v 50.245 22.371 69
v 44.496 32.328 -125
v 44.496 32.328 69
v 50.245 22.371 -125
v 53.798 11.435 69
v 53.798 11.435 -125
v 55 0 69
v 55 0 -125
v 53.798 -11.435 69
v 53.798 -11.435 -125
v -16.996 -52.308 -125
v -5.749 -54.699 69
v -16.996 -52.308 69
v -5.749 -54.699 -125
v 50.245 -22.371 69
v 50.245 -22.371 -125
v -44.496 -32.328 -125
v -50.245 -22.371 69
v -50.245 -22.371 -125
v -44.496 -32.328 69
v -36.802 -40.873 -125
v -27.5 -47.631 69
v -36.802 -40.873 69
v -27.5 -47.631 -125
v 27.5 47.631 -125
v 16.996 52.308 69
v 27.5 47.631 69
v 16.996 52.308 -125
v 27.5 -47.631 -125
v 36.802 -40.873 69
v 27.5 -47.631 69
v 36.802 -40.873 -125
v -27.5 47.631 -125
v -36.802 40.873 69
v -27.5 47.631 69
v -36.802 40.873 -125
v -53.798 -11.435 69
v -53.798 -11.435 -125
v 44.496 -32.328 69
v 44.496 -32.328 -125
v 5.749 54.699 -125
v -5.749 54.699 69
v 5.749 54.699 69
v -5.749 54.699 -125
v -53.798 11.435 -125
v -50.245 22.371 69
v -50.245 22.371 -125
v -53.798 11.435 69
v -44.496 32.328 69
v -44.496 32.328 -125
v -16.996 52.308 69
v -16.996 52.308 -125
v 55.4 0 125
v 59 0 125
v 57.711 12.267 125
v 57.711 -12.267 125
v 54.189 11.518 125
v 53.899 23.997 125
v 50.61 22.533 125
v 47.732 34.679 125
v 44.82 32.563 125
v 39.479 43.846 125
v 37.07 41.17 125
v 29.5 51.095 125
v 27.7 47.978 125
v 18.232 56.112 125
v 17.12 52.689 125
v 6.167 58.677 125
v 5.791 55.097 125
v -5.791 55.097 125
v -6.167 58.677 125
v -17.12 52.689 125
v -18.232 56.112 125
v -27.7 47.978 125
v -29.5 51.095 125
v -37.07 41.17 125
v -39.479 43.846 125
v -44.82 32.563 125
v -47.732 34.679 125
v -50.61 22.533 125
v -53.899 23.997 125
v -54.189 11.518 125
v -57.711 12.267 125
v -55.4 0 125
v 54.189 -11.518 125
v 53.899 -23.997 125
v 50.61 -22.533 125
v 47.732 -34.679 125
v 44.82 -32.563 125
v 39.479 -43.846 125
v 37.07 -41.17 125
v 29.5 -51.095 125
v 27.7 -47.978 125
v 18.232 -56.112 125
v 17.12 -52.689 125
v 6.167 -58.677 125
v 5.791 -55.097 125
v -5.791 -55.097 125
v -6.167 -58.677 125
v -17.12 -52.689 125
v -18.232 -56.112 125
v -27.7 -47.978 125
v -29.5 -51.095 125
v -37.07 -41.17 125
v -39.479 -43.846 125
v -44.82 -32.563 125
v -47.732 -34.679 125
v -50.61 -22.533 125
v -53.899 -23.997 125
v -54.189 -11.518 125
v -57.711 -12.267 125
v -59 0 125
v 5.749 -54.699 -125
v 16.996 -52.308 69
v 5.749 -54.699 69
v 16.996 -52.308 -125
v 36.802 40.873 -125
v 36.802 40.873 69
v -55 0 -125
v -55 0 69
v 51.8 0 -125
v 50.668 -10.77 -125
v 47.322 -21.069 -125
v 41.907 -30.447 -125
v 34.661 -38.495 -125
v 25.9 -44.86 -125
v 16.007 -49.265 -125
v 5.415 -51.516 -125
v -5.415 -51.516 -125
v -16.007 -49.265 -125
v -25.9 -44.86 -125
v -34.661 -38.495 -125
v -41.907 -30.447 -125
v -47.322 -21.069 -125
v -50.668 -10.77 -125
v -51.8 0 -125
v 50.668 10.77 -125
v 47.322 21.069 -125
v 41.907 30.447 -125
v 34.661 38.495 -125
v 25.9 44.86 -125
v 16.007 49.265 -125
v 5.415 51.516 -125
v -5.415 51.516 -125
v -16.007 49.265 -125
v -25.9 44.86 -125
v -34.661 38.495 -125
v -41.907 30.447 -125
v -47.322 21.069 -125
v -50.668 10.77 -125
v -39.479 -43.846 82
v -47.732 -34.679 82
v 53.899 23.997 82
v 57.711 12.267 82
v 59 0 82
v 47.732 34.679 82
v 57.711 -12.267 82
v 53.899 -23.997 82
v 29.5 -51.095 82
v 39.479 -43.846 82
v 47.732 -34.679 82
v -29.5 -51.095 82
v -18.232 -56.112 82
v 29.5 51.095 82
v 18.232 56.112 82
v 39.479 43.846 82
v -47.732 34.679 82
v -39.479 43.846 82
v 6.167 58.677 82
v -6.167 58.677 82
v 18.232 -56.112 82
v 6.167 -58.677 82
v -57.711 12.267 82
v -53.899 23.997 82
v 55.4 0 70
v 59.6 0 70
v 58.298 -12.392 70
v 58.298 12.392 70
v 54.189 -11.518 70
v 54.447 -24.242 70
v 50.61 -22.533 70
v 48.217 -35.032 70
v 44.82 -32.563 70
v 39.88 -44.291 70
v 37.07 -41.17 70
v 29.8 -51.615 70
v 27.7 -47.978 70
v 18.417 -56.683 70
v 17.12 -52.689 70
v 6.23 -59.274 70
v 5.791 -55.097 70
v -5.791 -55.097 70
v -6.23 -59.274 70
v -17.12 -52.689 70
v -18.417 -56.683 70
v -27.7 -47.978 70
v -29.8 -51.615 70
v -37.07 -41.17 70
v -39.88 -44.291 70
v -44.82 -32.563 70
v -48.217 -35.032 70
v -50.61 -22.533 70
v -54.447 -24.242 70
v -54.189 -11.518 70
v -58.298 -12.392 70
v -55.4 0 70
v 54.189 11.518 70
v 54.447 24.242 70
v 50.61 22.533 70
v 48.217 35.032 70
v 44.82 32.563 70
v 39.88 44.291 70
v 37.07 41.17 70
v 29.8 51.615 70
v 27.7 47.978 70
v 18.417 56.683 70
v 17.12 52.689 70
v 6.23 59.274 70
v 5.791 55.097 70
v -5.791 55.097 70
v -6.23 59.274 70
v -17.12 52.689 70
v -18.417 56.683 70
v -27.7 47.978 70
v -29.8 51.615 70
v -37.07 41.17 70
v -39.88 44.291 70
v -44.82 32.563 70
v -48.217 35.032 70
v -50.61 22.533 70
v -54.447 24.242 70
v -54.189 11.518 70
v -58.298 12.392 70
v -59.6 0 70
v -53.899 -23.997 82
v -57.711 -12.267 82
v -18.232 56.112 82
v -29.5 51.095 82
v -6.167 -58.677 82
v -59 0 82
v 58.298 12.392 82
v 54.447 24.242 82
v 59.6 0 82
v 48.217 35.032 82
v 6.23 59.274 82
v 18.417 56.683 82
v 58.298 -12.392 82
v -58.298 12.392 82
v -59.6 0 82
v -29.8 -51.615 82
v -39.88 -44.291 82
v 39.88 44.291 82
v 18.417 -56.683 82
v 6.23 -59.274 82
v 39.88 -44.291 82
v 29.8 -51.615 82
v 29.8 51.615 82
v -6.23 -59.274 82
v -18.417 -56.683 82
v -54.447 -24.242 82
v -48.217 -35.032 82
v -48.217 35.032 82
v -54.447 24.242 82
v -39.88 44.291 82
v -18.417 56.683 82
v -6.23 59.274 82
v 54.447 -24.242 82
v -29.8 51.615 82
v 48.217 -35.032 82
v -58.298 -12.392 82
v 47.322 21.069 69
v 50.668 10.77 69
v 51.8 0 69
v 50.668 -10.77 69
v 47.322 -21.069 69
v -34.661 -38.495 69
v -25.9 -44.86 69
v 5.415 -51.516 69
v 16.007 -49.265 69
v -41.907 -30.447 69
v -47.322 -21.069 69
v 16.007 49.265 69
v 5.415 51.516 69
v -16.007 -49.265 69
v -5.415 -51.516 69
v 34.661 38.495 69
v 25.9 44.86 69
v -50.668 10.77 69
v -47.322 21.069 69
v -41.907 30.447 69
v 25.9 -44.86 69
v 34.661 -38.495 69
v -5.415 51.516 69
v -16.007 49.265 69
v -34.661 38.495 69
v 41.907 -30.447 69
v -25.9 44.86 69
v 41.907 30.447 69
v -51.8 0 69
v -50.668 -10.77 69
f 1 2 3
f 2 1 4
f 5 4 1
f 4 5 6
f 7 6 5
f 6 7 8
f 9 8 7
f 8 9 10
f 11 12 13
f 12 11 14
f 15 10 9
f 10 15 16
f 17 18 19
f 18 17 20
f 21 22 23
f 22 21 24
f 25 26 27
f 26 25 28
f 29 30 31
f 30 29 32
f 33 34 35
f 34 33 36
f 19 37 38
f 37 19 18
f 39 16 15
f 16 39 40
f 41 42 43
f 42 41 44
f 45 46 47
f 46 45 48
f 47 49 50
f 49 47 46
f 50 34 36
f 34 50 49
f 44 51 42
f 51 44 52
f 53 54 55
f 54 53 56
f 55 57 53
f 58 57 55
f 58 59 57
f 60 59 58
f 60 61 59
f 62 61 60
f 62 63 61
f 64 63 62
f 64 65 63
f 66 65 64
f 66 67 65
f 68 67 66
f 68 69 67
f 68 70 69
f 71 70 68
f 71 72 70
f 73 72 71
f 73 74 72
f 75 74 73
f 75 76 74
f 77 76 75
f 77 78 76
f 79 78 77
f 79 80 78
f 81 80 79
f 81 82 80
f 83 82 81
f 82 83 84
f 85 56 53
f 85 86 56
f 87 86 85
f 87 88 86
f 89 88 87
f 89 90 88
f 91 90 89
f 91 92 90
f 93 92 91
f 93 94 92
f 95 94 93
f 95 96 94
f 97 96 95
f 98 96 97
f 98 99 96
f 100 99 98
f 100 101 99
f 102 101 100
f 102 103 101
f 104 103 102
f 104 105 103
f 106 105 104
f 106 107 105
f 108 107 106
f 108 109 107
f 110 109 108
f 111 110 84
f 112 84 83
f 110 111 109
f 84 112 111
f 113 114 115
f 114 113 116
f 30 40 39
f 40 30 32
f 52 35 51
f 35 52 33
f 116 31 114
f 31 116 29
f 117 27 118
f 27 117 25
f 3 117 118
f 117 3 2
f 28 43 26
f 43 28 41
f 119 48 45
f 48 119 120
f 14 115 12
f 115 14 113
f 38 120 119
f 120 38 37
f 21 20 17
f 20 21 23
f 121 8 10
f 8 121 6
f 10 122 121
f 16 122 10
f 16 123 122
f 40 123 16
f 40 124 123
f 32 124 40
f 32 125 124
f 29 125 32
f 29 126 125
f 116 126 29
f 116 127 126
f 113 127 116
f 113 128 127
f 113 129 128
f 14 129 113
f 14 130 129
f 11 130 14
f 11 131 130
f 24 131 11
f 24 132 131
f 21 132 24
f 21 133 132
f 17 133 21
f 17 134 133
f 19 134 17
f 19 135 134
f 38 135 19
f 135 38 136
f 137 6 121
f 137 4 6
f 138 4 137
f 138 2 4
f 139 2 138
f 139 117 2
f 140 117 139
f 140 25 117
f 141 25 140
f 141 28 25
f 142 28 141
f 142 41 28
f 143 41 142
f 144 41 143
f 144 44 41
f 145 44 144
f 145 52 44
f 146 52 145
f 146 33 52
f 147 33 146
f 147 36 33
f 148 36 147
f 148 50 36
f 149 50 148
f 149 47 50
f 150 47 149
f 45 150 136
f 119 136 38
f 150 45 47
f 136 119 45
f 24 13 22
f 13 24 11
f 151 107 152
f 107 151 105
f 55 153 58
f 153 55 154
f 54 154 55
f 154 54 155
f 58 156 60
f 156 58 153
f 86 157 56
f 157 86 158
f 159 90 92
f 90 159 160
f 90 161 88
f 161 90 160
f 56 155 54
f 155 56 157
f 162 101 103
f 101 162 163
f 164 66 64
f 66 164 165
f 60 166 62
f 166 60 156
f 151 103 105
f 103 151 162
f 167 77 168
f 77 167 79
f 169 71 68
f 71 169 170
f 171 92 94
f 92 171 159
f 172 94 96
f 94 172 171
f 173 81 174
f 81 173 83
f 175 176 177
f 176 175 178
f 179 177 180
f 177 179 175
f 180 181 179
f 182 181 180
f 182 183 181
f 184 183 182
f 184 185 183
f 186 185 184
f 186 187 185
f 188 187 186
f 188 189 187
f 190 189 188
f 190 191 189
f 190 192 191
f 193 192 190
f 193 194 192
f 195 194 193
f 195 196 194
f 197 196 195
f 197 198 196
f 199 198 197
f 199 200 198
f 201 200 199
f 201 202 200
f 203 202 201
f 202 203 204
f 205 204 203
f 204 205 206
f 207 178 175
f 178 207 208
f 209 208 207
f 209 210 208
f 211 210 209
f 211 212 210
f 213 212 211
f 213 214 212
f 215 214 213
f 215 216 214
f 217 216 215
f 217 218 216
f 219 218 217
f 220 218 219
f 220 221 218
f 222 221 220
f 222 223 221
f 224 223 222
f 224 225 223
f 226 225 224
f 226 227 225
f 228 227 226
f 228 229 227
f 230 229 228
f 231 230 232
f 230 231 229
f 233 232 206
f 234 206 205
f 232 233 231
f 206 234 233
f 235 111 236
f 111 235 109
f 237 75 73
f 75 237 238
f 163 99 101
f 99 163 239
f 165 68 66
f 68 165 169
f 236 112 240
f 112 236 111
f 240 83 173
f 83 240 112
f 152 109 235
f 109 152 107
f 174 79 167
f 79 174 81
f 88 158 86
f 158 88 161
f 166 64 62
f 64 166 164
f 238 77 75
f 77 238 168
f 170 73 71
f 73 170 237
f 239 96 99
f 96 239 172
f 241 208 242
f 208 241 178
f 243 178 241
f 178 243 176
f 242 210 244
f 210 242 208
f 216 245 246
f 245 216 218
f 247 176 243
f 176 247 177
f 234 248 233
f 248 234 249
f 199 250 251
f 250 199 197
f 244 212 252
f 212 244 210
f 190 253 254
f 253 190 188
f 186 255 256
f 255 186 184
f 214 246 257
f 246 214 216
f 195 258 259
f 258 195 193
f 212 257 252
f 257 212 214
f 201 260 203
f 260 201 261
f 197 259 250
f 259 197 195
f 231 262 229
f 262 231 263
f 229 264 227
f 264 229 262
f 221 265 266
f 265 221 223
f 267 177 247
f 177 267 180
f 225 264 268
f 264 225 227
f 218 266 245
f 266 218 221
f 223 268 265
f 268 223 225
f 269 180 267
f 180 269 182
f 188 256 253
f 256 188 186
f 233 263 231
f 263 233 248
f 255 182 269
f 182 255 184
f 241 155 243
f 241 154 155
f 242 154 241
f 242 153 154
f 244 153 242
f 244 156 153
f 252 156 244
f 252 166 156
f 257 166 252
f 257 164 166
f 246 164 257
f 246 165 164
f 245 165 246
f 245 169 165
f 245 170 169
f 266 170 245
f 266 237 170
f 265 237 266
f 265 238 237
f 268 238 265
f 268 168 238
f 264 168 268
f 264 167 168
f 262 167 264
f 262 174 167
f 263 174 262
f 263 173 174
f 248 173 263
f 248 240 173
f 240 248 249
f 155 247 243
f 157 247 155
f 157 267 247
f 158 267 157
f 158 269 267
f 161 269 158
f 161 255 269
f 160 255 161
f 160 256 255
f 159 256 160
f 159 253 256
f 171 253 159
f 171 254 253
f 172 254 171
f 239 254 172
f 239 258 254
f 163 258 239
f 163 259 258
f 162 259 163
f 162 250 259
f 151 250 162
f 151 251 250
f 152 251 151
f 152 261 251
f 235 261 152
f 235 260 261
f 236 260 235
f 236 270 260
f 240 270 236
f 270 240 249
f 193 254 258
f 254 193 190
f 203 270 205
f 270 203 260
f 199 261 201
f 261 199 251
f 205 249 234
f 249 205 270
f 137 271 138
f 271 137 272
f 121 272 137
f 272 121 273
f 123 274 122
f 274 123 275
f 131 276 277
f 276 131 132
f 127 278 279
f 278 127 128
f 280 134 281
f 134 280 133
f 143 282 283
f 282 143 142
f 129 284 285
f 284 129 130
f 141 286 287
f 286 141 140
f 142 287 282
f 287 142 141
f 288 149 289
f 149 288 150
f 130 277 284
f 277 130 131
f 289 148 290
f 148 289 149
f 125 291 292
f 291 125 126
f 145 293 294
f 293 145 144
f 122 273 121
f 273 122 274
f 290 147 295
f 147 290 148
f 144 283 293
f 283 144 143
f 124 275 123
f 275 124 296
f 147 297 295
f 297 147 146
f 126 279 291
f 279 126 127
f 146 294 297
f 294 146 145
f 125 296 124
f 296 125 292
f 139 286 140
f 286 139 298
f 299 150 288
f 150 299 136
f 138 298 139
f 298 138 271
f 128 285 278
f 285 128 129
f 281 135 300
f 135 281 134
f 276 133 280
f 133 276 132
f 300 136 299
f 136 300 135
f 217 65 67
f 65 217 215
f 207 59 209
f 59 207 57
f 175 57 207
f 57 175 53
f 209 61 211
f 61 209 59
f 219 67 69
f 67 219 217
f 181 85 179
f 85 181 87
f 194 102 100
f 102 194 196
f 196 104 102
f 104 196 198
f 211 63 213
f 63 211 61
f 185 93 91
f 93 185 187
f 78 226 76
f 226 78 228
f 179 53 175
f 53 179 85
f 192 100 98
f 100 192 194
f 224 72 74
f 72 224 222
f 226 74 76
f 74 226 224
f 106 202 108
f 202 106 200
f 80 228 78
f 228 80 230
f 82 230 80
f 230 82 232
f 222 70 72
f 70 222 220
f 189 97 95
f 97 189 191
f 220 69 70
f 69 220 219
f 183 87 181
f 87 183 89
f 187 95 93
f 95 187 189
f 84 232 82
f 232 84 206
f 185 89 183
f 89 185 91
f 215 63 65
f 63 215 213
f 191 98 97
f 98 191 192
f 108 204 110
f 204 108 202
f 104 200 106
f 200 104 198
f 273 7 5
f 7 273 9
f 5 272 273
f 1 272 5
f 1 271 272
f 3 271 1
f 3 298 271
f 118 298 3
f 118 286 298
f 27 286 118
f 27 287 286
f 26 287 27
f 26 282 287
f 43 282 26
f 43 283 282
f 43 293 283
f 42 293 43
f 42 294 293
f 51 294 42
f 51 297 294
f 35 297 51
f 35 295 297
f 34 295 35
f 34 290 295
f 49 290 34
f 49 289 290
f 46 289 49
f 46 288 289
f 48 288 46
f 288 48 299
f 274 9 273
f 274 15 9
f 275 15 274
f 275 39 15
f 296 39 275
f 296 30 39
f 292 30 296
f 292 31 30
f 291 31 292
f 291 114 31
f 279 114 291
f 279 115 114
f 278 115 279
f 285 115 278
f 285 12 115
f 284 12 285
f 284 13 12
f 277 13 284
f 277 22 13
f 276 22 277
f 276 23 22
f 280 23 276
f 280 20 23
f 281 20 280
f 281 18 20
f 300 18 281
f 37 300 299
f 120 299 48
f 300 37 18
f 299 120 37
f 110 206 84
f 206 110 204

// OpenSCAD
// Parameters
pipe_length = 250; //[125:500:1]
outer_diameter = 110; //[55:220:1]
wall_thickness = 3.2; //[1.6:6.4:0.1]
socket_length = 55; //[28:110:1]
socket_outer_diameter = 118; //[112:140:1]
socket_wall_thickness = 3.6; //[1.8:7.2:0.1]
chamfer_length = 2; //[1:6:0.5]
marking_band_length = 12; //[6:30:1]
marking_band_height = 0.6; //[0.2:1.5:0.1]
overlap = 1; //[0.5:2:0.1]

// Base Shapes
module pipe_body_outer() {
  cylinder(h=pipe_length, r=outer_diameter/2, center=true);
}

module inner_bore_main() {
  cylinder(h=pipe_length + 2*overlap, r=outer_diameter/2 - wall_thickness, center=true);
}

module socket_end_outer() {
  cylinder(h=socket_length, r=socket_outer_diameter/2, center=true);
}

module inner_bore_socket() {
  cylinder(h=socket_length + 2*overlap, r=socket_outer_diameter/2 - socket_wall_thickness, center=true);
}

module chamfer_spigot_outer() {
  rotate([180, 0, 0])
    cylinder(h=chamfer_length, r1=outer_diameter/2, r2=0, center=true);
}

module chamfer_socket_outer() {
  cylinder(h=chamfer_length, r1=socket_outer_diameter/2, r2=0, center=true);
}

module marking_band() {
  cylinder(h=marking_band_length, r=socket_outer_diameter/2 + marking_band_height, center=true);
}

// Operations
module pipe_outer_with_socket() {
  union() {
    pipe_body_outer();
    translate([0, 0, pipe_length/2 - socket_length/2]) socket_end_outer();
  }
}

module pipe_outer_with_marking() {
  union() {
    pipe_outer_with_socket();
    translate([0, 0, pipe_length/2 - socket_length + marking_band_length/2]) marking_band();
  }
}

module pipe_outer_with_chamfers() {
  union() {
    pipe_outer_with_marking();
    translate([0, 0, -pipe_length/2 + chamfer_length/2]) chamfer_spigot_outer();
    translate([0, 0, pipe_length/2 - chamfer_length/2]) chamfer_socket_outer();
  }
}

module pipe_hollowed() {
  difference() {
    pipe_outer_with_chamfers();
    inner_bore_main();
    translate([0, 0, pipe_length/2 - socket_length/2]) inner_bore_socket();
  }
}

// Final Output
pipe_hollowed();
